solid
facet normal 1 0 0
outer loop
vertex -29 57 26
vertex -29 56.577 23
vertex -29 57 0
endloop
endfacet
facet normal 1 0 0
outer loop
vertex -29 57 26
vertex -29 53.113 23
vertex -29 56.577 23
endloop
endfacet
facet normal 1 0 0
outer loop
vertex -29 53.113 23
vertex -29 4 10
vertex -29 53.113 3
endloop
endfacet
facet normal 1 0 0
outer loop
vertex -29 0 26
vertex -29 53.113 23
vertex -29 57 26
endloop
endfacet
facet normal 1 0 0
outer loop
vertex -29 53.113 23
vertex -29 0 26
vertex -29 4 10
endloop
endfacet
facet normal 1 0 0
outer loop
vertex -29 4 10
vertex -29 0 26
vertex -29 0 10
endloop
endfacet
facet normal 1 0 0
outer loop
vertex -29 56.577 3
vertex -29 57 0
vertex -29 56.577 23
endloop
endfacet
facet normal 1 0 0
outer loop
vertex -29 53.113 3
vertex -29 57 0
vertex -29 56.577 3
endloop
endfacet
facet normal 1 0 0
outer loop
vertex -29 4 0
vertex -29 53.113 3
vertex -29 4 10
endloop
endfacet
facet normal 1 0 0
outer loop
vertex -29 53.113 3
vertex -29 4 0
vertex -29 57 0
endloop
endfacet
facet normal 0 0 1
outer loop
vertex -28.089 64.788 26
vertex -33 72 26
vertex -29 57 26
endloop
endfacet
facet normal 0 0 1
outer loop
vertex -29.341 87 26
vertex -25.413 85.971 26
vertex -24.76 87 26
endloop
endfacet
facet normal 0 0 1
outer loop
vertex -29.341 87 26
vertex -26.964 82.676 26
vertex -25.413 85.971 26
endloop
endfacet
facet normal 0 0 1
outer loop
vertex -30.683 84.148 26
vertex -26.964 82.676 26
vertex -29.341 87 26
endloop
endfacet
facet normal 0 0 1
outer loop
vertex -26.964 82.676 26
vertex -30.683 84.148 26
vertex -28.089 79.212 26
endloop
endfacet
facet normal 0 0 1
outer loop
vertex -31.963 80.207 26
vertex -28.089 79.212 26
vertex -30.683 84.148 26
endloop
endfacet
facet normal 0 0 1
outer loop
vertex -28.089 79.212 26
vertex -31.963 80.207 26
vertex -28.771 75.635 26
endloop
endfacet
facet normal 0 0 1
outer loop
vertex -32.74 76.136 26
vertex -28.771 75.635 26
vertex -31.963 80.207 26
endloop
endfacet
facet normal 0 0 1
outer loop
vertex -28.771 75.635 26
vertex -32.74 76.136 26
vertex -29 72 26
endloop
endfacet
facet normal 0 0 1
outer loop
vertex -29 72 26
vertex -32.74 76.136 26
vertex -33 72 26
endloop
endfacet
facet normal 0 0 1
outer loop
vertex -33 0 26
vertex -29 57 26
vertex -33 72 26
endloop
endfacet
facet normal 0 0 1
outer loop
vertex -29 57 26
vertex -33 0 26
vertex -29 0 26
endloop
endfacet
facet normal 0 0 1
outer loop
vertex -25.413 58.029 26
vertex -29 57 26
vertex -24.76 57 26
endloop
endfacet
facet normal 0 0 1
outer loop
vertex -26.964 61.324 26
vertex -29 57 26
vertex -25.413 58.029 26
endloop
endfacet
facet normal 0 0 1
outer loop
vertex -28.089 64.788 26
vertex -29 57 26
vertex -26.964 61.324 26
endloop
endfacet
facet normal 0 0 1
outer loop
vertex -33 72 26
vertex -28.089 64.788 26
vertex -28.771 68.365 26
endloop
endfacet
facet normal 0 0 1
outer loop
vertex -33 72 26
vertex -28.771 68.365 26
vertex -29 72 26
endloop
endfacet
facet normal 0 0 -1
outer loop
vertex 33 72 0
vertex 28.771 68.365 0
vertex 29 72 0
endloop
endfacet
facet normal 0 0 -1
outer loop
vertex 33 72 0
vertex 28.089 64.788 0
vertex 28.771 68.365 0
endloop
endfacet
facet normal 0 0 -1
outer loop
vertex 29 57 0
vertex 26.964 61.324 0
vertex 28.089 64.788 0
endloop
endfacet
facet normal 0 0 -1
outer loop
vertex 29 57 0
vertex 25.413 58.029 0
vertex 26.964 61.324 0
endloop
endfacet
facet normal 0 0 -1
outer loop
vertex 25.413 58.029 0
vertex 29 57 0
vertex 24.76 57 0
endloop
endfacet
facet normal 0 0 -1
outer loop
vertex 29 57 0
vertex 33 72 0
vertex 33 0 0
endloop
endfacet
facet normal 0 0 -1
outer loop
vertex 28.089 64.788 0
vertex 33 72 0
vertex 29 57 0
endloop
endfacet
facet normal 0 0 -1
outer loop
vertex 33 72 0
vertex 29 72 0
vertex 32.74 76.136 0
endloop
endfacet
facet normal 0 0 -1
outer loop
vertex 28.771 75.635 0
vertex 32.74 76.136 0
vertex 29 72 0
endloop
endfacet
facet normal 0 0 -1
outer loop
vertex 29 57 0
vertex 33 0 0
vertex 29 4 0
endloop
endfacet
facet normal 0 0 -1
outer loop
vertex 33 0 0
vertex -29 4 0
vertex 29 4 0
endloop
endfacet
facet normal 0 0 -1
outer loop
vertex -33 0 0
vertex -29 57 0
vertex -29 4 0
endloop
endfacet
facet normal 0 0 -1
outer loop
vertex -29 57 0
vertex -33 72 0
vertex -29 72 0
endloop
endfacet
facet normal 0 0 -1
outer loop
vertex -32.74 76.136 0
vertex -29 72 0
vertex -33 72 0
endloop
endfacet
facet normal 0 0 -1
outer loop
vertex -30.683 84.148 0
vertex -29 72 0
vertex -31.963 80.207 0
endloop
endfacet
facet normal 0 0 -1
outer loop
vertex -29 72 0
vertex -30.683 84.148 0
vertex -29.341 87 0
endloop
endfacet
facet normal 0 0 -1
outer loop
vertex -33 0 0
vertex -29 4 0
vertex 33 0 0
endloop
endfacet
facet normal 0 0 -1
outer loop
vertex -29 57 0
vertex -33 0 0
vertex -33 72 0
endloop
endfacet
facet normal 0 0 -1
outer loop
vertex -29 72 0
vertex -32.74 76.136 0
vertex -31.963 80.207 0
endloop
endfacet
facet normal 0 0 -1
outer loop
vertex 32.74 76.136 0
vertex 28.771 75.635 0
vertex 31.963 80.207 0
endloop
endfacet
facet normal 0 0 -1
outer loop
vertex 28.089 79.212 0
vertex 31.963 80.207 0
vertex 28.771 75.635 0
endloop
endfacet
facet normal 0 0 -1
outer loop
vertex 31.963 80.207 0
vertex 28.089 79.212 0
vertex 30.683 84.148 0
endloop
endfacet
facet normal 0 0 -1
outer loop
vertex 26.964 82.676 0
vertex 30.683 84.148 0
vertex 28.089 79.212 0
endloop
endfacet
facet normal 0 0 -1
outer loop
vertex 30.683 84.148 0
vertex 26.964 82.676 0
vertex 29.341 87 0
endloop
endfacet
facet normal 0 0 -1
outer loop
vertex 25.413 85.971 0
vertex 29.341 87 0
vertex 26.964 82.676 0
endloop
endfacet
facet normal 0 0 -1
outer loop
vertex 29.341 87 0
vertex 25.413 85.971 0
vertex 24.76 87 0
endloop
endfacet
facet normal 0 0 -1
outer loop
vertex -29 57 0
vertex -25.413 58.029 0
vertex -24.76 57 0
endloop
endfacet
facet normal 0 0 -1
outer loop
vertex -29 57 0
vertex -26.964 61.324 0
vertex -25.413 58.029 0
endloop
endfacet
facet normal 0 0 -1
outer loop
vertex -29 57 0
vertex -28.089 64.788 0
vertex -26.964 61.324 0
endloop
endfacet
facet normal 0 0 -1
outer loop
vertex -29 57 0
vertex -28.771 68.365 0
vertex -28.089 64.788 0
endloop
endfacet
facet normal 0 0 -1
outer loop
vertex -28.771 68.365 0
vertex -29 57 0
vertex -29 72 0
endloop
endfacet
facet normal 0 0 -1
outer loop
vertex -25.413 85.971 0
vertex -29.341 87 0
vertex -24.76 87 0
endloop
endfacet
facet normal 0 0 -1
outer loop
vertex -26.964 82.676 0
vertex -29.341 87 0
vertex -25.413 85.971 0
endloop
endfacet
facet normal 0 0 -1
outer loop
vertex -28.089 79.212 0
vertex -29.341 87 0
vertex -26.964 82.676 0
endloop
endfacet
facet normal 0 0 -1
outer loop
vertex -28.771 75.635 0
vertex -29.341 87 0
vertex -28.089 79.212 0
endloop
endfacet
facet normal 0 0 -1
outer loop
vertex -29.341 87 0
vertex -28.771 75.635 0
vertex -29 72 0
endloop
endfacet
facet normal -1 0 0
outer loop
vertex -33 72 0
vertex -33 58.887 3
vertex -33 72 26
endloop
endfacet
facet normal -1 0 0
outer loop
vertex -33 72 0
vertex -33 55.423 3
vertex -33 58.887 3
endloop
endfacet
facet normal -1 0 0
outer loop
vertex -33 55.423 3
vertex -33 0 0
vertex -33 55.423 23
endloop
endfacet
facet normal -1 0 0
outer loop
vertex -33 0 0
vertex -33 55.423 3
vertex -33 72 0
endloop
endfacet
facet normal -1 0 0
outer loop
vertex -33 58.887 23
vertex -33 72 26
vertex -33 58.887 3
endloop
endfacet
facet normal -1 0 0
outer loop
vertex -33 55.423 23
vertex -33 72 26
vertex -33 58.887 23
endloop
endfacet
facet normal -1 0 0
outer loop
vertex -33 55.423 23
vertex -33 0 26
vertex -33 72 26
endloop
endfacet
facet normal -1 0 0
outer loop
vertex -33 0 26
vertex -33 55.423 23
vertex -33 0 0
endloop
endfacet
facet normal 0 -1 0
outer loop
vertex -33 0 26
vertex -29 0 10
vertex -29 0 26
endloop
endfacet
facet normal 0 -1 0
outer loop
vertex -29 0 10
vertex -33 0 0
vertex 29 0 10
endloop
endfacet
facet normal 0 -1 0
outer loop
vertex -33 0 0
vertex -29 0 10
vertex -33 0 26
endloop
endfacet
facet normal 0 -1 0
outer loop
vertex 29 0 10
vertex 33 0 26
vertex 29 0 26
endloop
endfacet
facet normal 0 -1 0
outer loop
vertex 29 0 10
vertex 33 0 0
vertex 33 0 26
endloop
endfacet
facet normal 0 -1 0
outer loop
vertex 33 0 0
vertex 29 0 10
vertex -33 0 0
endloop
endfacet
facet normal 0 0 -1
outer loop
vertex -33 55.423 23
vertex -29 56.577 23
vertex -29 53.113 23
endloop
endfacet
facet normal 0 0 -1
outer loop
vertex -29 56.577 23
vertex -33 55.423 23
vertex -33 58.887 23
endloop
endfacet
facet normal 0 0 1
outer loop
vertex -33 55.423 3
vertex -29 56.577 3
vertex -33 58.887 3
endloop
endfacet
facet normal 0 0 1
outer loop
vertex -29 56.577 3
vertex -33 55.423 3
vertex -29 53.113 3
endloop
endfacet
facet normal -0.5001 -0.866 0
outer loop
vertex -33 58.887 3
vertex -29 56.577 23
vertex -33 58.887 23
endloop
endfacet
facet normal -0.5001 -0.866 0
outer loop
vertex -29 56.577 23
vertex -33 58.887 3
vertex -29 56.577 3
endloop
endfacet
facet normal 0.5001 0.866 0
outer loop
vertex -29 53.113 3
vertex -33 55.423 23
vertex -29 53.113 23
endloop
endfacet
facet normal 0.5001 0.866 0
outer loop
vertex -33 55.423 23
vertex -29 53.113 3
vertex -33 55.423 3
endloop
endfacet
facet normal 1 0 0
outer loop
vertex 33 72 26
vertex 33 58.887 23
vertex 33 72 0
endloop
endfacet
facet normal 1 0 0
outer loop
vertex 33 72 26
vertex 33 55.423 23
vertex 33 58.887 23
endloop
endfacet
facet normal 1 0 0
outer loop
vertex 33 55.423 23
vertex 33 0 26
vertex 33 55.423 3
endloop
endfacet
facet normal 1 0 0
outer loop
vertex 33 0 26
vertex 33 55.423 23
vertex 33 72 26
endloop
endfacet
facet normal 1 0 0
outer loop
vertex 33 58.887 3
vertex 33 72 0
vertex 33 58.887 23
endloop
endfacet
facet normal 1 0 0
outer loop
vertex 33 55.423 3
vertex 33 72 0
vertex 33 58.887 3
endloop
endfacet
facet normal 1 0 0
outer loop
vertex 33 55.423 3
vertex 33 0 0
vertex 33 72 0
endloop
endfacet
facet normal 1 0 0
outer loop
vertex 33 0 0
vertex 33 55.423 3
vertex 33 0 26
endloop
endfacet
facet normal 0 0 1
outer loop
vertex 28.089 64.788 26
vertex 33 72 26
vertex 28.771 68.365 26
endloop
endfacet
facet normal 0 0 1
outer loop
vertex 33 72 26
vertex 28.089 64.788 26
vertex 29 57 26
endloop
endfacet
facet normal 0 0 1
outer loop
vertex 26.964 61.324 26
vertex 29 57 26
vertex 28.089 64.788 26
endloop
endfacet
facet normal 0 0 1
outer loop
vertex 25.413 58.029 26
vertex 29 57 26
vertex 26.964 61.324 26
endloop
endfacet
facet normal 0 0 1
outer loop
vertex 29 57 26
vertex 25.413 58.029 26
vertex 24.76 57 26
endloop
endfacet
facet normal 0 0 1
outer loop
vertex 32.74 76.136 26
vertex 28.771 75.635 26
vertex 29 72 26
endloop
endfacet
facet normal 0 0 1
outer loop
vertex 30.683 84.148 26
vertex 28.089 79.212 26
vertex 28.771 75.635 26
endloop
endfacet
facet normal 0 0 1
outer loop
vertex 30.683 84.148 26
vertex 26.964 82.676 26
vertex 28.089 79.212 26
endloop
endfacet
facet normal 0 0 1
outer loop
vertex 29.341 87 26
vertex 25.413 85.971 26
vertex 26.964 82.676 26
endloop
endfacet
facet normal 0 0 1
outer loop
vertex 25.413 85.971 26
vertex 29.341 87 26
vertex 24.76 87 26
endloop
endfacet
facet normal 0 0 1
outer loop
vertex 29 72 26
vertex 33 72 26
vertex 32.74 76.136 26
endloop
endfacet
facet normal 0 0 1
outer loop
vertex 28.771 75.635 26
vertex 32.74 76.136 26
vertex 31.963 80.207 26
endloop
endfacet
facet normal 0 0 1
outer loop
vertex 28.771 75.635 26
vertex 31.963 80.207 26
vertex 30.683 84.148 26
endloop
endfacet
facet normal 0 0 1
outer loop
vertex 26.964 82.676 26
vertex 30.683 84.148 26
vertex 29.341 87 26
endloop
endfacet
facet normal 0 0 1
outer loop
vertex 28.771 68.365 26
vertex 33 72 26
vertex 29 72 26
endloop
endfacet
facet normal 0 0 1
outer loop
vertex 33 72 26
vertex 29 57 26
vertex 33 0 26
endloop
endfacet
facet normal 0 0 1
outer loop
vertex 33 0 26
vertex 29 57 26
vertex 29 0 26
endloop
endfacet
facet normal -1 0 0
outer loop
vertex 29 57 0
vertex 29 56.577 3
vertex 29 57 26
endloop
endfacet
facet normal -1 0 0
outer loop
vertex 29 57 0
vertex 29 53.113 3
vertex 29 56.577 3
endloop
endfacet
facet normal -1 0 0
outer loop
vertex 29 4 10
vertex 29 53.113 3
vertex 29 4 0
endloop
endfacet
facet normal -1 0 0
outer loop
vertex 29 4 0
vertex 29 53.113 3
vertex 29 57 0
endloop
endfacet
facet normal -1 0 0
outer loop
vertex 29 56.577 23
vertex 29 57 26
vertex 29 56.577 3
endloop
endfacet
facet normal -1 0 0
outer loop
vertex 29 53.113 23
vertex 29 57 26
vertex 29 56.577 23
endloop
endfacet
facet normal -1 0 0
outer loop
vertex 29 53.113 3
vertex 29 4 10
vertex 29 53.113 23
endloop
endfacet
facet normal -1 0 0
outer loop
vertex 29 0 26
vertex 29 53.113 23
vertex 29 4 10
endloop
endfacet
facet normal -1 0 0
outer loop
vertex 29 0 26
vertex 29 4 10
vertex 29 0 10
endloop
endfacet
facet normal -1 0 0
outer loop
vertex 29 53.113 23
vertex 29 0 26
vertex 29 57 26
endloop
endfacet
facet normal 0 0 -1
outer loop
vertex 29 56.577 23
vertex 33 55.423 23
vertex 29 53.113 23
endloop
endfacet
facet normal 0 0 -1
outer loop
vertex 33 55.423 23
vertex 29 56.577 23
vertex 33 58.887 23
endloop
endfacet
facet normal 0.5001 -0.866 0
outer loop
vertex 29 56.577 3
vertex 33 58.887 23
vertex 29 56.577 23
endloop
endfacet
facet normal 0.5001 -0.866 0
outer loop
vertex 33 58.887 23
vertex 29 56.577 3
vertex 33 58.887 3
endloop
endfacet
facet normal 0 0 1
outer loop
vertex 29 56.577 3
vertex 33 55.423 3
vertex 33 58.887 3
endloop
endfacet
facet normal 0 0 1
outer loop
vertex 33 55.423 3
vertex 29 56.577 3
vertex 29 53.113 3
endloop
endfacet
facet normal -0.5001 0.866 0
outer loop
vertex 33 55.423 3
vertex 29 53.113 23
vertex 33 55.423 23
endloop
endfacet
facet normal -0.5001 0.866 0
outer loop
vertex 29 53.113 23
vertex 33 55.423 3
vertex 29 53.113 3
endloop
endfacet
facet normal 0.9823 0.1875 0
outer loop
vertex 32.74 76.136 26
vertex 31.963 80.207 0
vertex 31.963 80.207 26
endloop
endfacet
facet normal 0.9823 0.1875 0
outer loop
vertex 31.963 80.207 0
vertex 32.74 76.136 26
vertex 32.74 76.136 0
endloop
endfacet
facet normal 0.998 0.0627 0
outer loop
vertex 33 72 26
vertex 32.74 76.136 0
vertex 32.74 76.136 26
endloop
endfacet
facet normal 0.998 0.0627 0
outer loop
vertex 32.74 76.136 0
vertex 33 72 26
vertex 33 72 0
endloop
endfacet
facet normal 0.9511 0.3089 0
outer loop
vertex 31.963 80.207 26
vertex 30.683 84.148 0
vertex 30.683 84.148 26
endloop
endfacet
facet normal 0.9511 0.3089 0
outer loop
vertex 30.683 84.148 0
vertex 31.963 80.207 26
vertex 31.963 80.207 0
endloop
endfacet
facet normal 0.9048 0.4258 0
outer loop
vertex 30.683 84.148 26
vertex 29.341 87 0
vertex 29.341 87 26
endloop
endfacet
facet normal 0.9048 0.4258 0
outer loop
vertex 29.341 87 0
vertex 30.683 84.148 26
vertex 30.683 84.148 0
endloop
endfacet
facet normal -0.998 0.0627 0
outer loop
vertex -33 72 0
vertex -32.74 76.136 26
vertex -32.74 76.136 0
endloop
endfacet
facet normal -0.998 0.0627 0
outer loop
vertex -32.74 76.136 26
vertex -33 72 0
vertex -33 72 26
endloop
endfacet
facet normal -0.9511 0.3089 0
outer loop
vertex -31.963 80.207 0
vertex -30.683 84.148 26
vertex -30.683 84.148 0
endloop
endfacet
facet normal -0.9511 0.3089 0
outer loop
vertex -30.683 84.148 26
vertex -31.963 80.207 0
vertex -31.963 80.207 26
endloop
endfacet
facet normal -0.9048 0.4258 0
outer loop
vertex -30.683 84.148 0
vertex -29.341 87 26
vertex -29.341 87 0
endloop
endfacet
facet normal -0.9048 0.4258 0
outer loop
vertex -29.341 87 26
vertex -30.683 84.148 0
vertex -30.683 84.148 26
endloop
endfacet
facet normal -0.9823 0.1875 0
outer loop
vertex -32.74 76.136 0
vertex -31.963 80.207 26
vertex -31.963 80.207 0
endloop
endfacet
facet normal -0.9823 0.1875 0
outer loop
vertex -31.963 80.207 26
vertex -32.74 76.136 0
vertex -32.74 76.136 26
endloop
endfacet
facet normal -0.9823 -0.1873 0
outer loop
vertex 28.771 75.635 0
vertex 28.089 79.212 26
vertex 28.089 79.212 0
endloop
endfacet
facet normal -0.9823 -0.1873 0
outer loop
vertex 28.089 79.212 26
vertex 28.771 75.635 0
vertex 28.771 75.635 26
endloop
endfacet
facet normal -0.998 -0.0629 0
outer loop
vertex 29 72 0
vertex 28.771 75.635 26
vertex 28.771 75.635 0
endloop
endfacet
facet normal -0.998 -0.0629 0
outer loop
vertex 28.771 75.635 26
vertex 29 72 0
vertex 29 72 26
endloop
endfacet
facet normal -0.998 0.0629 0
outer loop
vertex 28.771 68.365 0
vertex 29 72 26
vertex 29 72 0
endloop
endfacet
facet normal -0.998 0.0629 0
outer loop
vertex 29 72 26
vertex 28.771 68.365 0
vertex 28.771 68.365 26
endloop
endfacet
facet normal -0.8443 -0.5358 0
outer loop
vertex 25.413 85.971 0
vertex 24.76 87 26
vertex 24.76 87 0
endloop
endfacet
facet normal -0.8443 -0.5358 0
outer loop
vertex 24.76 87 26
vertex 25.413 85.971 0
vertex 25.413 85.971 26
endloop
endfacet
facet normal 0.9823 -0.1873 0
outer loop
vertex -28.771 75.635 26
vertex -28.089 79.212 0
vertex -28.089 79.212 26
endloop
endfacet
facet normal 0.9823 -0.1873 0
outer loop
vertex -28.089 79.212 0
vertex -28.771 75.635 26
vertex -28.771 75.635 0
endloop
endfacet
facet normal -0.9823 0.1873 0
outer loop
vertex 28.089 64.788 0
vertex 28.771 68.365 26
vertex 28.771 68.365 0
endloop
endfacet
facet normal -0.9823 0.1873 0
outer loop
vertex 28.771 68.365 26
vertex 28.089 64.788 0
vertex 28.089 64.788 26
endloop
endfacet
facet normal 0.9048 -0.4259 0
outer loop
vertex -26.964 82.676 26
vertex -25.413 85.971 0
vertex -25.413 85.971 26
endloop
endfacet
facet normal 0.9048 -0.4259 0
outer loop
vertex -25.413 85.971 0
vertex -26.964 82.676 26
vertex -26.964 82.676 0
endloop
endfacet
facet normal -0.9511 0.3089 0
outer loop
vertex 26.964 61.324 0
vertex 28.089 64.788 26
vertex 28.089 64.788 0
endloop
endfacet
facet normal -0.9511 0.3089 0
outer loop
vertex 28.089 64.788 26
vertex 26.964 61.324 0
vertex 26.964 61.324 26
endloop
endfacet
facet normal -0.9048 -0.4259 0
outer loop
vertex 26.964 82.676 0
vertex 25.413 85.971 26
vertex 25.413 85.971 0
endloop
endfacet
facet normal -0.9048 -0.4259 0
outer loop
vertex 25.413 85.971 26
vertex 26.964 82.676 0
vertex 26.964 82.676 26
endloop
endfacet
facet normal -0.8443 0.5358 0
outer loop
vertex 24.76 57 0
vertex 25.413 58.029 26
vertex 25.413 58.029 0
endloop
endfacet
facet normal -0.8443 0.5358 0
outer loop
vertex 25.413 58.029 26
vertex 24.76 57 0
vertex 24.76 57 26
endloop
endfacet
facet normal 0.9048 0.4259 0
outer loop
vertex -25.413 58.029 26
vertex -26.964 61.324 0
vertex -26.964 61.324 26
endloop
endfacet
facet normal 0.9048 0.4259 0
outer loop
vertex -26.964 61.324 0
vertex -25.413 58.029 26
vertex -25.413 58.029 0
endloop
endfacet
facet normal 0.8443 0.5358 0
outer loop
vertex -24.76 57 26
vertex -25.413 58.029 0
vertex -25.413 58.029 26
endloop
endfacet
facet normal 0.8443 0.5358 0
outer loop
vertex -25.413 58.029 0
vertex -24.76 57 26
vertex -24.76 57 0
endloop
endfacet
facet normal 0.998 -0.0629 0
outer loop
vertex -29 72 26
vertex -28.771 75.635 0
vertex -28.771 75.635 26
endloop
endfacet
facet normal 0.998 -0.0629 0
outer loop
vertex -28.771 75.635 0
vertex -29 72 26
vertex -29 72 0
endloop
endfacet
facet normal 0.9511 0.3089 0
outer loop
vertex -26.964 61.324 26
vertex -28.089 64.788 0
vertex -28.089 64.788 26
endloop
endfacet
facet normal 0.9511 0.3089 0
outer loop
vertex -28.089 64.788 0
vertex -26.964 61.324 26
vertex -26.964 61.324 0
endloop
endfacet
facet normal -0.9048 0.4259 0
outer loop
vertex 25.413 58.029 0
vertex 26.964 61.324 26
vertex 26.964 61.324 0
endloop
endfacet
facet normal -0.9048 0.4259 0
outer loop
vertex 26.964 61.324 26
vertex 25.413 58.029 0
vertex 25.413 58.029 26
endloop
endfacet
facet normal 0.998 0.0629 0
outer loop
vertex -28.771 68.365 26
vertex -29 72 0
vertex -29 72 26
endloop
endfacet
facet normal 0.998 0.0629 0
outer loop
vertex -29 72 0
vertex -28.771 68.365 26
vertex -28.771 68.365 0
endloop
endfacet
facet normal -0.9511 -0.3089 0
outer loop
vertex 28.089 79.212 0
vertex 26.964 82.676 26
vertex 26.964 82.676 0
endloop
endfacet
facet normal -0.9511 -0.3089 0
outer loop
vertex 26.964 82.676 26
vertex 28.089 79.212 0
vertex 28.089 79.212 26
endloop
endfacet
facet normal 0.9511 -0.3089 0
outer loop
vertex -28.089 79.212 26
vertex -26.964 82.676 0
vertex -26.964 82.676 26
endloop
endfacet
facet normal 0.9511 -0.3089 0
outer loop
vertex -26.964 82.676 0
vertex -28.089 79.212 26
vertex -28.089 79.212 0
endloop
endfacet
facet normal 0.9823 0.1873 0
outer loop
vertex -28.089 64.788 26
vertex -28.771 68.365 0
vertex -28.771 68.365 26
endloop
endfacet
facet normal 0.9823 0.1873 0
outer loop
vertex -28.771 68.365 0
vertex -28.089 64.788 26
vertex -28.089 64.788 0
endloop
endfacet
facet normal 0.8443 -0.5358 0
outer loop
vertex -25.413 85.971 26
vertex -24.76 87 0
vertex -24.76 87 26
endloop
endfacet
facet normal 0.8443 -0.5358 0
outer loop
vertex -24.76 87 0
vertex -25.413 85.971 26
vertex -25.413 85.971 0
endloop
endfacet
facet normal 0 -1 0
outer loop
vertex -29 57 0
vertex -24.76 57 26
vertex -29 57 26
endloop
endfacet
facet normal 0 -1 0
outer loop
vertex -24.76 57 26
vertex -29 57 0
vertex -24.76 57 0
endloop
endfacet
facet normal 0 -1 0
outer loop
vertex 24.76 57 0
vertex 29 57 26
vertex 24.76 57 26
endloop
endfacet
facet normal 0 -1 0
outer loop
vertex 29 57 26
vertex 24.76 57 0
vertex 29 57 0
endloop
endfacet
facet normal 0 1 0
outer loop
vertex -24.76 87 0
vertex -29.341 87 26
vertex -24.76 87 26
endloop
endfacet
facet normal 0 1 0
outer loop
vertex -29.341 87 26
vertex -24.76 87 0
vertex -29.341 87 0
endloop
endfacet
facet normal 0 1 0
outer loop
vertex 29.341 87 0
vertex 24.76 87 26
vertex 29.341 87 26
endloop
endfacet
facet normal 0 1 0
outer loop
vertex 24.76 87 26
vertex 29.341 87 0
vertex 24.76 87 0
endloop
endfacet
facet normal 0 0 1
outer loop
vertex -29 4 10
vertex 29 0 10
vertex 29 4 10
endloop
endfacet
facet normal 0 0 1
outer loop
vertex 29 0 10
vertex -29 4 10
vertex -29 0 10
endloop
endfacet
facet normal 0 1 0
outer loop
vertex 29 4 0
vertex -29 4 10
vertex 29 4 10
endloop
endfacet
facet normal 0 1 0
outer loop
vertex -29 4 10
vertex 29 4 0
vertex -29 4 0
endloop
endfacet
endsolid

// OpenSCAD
diameter = 58;
outerdiam = 8;
width = 4;
screw = 4;
screwHolder = 10 + width;
scratchHeight = 20;
height = 10;
heightHolder = scratchHeight+6;

$fn = 50;

module screwSupport(right, supHeight) {
    difference() {     
        cube([width, supHeight, heightHolder]);
        translate([width / 2, supHeight - 16, scratchHeight / 2 + 3]) 
            rotate([0, 0, 30 * right])
                cube([width * 2, 3, scratchHeight], center = true);
    }
}

holderHeight = diameter / 2 + 30 + 9 + width;

union() {
    translate([-diameter / 2, 0, 0]) cube([diameter, width, height]);

    translate([-(diameter / 2 + width), 0, 0]) screwSupport(-1, holderHeight);
    translate([diameter / 2, 0, 0]) screwSupport(1, holderHeight);

    translate([0, holderHeight, 0]) difference() {
        cylinder(h = heightHolder, d = diameter + outerdiam);
        
        cylinder(h = heightHolder, d = diameter);
        
        translate ([-(diameter + outerdiam) /2, -(diameter + outerdiam) - 15, 0]) cube([(diameter + outerdiam), diameter + outerdiam, heightHolder]);
        
        translate ([-(diameter + outerdiam) /2, 15, 0]) cube([(diameter + outerdiam), diameter + outerdiam, heightHolder]);
    }
}
